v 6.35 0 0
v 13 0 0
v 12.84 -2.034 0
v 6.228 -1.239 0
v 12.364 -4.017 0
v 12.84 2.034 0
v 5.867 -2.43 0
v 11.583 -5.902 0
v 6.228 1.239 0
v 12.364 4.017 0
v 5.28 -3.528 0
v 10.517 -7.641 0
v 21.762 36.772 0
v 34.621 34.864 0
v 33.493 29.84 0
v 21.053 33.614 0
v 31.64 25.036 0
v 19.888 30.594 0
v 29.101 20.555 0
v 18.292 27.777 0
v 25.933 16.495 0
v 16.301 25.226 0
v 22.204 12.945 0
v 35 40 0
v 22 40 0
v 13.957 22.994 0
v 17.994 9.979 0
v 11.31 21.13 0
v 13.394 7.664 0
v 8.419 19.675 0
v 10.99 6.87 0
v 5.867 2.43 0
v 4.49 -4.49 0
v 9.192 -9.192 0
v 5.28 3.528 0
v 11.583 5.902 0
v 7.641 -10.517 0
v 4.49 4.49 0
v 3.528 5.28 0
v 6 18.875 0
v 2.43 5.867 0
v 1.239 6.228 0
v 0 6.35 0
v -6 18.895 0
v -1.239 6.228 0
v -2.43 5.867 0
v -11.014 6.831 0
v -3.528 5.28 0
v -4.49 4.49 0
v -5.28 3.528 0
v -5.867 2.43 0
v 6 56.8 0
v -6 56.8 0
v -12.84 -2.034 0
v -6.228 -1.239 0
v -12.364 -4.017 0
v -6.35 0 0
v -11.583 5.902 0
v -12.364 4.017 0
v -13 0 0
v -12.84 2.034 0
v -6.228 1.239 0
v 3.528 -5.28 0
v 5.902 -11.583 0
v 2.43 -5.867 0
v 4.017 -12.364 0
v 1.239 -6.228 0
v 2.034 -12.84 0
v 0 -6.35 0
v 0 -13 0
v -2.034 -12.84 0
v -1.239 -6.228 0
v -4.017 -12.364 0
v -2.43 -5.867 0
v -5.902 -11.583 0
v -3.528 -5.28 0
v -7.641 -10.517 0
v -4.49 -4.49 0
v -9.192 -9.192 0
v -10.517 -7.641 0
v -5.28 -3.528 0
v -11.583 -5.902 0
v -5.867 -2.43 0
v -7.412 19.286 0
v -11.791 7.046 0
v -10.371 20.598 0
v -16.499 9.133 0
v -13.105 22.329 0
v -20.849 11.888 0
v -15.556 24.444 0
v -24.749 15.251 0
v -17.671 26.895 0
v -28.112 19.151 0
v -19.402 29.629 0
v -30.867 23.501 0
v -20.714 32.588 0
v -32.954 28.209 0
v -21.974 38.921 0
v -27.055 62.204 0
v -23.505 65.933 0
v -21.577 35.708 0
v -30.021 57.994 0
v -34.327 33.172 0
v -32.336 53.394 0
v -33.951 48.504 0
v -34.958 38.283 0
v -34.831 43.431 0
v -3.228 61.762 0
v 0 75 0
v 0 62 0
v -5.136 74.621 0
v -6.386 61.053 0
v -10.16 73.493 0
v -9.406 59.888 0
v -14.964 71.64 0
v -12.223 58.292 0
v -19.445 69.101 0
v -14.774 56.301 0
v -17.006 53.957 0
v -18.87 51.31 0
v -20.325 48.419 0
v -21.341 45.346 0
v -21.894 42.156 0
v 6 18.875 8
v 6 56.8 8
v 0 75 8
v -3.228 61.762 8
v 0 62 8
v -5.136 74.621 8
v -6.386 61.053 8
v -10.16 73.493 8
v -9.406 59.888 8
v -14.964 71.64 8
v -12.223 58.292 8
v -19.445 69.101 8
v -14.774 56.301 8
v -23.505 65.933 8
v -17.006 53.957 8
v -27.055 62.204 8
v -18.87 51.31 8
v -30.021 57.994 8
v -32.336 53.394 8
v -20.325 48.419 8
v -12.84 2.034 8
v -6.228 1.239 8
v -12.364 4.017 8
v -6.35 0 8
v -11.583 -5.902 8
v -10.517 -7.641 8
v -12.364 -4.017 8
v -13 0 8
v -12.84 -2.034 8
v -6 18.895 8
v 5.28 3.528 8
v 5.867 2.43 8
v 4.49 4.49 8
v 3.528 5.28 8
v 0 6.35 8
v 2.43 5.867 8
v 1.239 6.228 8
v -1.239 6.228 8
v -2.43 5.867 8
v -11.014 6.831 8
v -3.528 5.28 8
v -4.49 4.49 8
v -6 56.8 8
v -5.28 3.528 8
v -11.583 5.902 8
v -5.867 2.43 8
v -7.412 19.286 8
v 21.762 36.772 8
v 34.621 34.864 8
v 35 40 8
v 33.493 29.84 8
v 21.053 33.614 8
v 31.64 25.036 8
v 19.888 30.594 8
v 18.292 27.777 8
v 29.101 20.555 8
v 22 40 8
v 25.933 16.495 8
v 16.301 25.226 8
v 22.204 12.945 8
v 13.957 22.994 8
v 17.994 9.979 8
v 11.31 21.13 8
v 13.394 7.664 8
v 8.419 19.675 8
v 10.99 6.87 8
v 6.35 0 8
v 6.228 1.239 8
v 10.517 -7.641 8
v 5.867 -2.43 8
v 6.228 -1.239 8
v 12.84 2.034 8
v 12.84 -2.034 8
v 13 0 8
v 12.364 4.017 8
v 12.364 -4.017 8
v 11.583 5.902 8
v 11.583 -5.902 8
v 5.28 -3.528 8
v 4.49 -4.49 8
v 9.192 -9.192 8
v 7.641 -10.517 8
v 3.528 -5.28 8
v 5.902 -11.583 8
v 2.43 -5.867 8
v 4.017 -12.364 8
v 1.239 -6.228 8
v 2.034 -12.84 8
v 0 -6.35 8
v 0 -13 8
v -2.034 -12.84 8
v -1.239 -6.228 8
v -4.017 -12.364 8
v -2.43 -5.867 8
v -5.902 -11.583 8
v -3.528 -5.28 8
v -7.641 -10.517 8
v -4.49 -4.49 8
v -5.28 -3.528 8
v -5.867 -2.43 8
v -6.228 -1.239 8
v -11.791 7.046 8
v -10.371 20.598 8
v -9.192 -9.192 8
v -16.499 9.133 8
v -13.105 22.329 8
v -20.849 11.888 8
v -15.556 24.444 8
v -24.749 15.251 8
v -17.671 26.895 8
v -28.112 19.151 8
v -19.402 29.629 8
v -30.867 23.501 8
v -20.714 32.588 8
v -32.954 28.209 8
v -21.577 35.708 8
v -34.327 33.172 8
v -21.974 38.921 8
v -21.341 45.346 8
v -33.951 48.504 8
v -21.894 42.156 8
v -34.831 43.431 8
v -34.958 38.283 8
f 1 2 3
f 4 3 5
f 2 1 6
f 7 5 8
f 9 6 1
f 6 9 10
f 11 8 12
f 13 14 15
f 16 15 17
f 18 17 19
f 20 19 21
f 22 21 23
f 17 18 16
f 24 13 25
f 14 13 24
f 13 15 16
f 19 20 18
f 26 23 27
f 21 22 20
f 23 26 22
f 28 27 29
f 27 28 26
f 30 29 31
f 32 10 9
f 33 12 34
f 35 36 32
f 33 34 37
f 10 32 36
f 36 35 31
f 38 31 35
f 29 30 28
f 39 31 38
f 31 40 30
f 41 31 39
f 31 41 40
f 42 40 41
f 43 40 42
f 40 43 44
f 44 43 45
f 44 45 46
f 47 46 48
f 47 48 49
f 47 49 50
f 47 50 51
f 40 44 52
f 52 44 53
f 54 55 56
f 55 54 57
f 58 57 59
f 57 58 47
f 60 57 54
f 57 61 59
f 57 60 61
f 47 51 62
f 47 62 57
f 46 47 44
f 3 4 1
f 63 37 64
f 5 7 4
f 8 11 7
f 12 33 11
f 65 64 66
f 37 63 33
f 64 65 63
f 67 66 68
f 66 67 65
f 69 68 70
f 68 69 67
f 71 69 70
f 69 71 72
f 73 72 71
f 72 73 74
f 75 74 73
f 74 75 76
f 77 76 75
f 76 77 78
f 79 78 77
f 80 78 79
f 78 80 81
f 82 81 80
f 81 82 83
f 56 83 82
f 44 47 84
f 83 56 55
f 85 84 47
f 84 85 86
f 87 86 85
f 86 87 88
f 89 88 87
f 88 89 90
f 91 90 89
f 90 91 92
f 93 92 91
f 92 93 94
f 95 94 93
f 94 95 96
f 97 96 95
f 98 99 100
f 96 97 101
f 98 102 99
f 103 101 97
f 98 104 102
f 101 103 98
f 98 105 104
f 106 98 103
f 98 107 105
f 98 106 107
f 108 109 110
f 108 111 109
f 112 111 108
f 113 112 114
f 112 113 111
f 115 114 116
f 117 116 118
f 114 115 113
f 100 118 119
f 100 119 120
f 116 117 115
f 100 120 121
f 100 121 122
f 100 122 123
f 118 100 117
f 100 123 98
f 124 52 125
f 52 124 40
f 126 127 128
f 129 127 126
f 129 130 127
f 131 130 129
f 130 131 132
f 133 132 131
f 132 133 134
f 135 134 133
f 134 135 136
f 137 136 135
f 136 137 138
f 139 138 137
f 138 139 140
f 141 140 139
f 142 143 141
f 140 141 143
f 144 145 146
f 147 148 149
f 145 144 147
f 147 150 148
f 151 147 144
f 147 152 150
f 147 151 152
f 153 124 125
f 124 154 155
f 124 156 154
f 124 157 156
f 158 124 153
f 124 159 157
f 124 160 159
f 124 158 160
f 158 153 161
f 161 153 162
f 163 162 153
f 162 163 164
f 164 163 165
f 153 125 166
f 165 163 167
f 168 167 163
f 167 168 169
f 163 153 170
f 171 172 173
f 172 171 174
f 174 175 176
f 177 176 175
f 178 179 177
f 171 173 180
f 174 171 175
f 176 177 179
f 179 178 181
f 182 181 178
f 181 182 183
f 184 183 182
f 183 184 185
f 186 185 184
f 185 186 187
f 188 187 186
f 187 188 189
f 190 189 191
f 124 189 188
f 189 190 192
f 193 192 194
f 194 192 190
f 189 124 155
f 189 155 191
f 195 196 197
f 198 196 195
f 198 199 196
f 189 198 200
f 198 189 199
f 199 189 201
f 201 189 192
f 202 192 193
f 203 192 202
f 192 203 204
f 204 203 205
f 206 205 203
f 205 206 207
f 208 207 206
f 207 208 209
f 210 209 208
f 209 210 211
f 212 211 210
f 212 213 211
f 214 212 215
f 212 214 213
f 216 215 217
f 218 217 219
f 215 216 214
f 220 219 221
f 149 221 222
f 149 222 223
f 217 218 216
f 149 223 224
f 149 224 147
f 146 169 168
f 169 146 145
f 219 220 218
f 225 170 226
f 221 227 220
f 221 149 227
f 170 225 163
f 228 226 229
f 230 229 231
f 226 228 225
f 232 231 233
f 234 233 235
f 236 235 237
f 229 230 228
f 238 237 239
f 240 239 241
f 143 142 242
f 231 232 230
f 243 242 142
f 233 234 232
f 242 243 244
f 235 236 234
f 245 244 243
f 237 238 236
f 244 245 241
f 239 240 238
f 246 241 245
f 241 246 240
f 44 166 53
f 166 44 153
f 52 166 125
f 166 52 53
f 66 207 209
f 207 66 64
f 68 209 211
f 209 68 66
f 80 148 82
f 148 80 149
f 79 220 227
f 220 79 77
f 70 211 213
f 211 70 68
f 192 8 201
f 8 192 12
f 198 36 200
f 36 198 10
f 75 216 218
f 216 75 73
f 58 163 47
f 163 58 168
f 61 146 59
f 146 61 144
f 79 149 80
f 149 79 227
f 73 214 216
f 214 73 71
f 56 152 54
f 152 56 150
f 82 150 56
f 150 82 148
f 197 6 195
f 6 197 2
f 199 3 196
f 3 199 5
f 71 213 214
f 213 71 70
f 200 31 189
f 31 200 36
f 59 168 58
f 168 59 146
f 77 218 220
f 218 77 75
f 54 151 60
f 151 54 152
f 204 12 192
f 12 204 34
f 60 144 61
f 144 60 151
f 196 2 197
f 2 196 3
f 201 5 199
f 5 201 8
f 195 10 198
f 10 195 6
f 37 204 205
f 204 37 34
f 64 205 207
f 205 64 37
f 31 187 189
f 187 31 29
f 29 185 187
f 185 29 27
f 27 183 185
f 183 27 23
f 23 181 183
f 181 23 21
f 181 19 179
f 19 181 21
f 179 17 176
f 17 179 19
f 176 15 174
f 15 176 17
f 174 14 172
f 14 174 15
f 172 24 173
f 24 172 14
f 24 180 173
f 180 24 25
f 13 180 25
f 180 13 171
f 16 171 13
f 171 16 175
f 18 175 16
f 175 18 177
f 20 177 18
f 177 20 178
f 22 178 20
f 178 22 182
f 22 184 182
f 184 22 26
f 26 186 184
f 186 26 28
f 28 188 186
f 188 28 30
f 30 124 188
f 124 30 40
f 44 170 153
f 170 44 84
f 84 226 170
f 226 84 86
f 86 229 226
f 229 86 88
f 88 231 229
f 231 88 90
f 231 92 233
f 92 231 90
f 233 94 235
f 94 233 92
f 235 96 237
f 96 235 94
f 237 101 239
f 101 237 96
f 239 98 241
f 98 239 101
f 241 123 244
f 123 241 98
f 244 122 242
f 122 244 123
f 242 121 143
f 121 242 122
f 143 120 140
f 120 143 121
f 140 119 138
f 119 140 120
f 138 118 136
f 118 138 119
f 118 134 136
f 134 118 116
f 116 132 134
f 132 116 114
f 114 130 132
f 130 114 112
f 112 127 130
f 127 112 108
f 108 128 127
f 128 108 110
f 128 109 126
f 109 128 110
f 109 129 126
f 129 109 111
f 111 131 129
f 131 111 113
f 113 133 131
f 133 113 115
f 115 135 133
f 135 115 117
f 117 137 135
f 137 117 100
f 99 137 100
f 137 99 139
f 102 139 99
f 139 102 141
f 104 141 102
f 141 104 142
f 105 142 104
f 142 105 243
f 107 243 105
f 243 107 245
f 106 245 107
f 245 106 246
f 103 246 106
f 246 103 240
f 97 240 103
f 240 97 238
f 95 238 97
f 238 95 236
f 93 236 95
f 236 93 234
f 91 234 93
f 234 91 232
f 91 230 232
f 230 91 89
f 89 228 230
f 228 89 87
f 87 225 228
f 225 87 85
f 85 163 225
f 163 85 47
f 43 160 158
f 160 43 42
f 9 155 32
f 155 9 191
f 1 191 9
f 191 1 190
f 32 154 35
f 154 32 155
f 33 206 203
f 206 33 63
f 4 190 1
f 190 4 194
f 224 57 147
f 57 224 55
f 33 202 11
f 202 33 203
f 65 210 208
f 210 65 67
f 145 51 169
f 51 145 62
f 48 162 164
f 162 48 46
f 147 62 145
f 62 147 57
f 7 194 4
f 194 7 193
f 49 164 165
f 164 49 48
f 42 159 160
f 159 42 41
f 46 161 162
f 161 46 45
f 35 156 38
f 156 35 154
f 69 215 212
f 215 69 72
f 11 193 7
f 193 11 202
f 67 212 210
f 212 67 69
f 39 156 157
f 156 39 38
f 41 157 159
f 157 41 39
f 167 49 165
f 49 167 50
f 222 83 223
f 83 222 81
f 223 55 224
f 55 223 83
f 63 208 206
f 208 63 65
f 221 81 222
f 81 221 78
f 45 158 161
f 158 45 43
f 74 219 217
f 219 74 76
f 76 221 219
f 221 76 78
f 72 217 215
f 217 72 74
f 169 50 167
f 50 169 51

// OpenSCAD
$fn = 32;

// ----------------------------------------------------------------------
// Hook: 80 mm shank into a 22 mm curl, 8 mm thick
// ----------------------------------------------------------------------

// --- parameters (mm) ---
shank_len = 80;           // shank length from the boss centre
shank_w = 12;             // shank width
boss_d = 26;              // boss diameter
bore_d = 12.7;            // boss bore
curl_in = 22;             // curl inner radius
curl_out = 35;            // curl outer radius
curl_sweep = 270;         // curl sweep angle
hook_t = 8;               // hook thickness

shank_profile = [[-6, 56.8], [6, 56.8], [6, 11], [-6, 11]];
boss_profile = [[13, 0], [12.84, 2.034], [12.364, 4.017], [11.583, 5.902], [10.517, 7.641], [9.192, 9.192], [7.641, 10.517], [5.902, 11.583], [4.017, 12.364], [2.034, 12.84], [0, 13], [-2.034, 12.84], [-4.017, 12.364], [-5.902, 11.583], [-7.641, 10.517], [-9.192, 9.192], [-10.517, 7.641], [-11.583, 5.902], [-12.364, 4.017], [-12.84, 2.034], [-13, 0], [-12.84, -2.034], [-12.364, -4.017], [-11.583, -5.902], [-10.517, -7.641], [-9.192, -9.192], [-7.641, -10.517], [-5.902, -11.583], [-4.017, -12.364], [-2.034, -12.84], [0, -13], [2.034, -12.84], [4.017, -12.364], [5.902, -11.583], [7.641, -10.517], [9.192, -9.192], [10.517, -7.641], [11.583, -5.902], [12.364, -4.017], [12.84, -2.034]];
curl_profile = [[0, 75], [-5.136, 74.621], [-10.16, 73.493], [-14.964, 71.64], [-19.445, 69.101], [-23.505, 65.933], [-27.055, 62.204], [-30.021, 57.994], [-32.336, 53.394], [-33.951, 48.504], [-34.831, 43.431], [-34.958, 38.283], [-34.327, 33.172], [-32.954, 28.209], [-30.867, 23.501], [-28.112, 19.151], [-24.749, 15.251], [-20.849, 11.888], [-16.499, 9.133], [-11.791, 7.046], [-6.828, 5.673], [-1.717, 5.042], [3.431, 5.169], [8.504, 6.049], [13.394, 7.664], [17.994, 9.979], [22.204, 12.945], [25.933, 16.495], [29.101, 20.555], [31.64, 25.036], [33.493, 29.84], [34.621, 34.864], [35, 40], [22, 40], [21.762, 36.772], [21.053, 33.614], [19.888, 30.594], [18.292, 27.777], [16.301, 25.226], [13.957, 22.994], [11.31, 21.13], [8.419, 19.675], [5.346, 18.659], [2.156, 18.106], [-1.079, 18.026], [-4.292, 18.423], [-7.412, 19.286], [-10.371, 20.598], [-13.105, 22.329], [-15.556, 24.444], [-17.671, 26.895], [-19.402, 29.629], [-20.714, 32.588], [-21.577, 35.708], [-21.974, 38.921], [-21.894, 42.156], [-21.341, 45.346], [-20.325, 48.419], [-18.87, 51.31], [-17.006, 53.957], [-14.774, 56.301], [-12.223, 58.292], [-9.406, 59.888], [-6.386, 61.053], [-3.228, 61.762], [0, 62]];

difference() {
  union() {
    /* three overlapping outlines: shank, boss and the smooth curl */
    linear_extrude(height = hook_t) polygon(shank_profile);
    linear_extrude(height = hook_t) polygon(boss_profile);
    linear_extrude(height = hook_t) polygon(curl_profile);
  }
  translate([0, 0, -2.5]) cylinder(h = hook_t + 5, d = bore_d);
}
